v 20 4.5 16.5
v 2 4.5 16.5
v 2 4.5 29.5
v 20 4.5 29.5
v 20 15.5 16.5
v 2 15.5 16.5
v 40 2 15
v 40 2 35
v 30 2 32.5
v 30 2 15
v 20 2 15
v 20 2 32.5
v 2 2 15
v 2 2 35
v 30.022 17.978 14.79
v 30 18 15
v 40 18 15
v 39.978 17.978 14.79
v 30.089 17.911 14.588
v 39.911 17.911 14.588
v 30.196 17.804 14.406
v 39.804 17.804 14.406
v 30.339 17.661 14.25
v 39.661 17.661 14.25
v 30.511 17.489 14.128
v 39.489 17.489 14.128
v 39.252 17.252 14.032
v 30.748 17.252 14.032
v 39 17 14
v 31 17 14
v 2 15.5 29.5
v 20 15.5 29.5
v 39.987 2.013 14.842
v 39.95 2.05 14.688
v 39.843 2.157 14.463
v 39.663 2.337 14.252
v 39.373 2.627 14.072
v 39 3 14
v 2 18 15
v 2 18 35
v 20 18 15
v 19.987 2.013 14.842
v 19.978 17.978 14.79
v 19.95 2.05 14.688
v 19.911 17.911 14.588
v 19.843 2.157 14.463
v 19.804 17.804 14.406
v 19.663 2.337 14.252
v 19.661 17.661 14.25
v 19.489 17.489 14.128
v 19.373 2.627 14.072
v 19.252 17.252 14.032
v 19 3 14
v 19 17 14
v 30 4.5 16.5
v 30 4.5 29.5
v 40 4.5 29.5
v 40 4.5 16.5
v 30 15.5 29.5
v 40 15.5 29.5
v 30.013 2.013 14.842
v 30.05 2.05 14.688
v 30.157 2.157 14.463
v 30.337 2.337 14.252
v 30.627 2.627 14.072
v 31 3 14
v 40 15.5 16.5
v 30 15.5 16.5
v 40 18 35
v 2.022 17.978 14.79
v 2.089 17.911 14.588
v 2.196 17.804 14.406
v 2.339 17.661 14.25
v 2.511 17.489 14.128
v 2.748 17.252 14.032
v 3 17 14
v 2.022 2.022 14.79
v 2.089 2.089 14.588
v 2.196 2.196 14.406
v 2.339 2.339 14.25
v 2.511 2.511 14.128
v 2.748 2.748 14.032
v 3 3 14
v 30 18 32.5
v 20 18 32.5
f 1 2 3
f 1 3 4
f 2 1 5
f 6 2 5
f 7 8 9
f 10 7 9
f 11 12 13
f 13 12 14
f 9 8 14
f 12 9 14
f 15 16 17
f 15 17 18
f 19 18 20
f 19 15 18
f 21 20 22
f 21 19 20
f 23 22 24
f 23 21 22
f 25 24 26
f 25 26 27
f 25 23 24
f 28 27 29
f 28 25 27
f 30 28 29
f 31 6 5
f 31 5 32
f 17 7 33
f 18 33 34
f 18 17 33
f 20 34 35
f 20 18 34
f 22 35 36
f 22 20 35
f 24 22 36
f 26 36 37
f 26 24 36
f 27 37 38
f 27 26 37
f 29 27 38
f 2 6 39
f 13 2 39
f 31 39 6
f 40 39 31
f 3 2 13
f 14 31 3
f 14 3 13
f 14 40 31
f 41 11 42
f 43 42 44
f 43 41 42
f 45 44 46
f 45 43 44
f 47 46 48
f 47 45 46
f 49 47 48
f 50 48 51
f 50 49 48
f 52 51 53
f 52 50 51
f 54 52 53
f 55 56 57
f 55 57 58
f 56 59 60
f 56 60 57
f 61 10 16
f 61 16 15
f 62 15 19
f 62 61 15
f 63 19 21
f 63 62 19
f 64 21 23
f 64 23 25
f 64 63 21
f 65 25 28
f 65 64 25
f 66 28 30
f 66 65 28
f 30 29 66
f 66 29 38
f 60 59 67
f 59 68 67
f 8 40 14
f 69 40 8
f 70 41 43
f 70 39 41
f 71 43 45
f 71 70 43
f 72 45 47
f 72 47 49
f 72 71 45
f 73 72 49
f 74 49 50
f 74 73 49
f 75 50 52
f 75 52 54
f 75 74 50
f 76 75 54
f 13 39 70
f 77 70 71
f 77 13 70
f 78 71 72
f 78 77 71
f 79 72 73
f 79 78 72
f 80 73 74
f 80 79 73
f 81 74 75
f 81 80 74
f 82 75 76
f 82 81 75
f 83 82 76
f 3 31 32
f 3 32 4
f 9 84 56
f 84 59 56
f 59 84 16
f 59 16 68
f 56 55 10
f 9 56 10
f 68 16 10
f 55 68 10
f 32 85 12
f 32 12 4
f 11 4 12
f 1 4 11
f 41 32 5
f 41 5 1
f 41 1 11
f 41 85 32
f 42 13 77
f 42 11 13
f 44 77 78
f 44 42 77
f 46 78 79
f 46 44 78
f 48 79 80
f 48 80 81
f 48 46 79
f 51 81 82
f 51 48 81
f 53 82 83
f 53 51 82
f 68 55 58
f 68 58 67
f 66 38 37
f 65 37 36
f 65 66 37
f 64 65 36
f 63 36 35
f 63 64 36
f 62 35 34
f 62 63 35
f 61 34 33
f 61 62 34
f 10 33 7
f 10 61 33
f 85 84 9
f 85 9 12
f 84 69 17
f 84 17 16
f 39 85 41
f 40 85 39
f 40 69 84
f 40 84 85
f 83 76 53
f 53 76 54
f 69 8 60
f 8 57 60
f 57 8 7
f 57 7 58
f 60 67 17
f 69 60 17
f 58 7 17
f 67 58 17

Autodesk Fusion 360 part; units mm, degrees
sketch "Sketch1" plane through (0, 0, 0) normal (0, 0, 1) x (1, 0, 0)
  line L0 (0, 0) -> (60, 0)
  line L1 (60, 0) -> (60, 20)
  line L2 (60, 20) -> (0, 20)
  line L3 (0, 20) -> (0, 0)
  dimension "d1" = 60
  dimension "d2" = 20
extrude "Extrude1" add sketch "Sketch1" along normal blind 40
sketch "Sketch2" plane through (0, 0, 0) normal (-1, 0, 0) x (0, -1, 0)
  line L0 (-20, 0) -> (0, 0)
  line L1 (0, 0) -> (0, 40)
  line L2 (0, 40) -> (-20, 40)
  line L3 (-20, 40) -> (-20, 0)
  line L4 (-15, 28) -> (-5, 28)
  line L5 (-5, 28) -> (-5, 16)
  line L6 (-5, 16) -> (-15, 16)
  line L7 (-15, 16) -> (-15, 28)
  dimension "d5" = 10
  dimension "d6" = 12
  dimension "d7" = 5
extrude "Extrude2" cut sketch "Sketch2" against normal blind 30 contours L4 L5 L6 L7
extrude "Extrude3" cut 1 faces at (20, 13.3333, 40) along direction (0, 0, -1) blind 2
extrude "Extrude4" cut 1 faces at (20, 13.3333, 0) along direction (0, 0, 1) blind 2
sketch "Sketch3" plane through (0, 20, 0) normal (0, 1, 0) x (-1, 0, 0)
  line L0 (-60, 2) -> (0, 2)
  line L1 (0, 2) -> (0, 38)
  line L2 (0, 38) -> (-60, 38)
  line L3 (-60, 38) -> (-60, 2)
  line L4 (-40, 33) -> (-20, 33)
  line L5 (-20, 33) -> (-20, -1)
  line L6 (-20, -1) -> (-40, -1)
  line L7 (-40, -1) -> (-40, 33)
  dimension "d14" = 20
  dimension "d15" = 34
  dimension "d16" = 20
  dimension "d17" = 5
extrude "Extrude5" cut 1 faces at (20, 13.3333, 2) along direction (0, 0, 1) blind 9
extrude "Extrude6" cut 1 faces at (20, 13.3333, 11) along direction (0, 0, 1) blind 1
extrude "Extrude7" cut sketch "Sketch3" against normal blind 20 contours L0 L4 L5 L7
extrude "Extrude8" cut sketch "Sketch2" against normal blind 80 contours L4 L5 L6 L7
extrude "Extrude9" cut 1 faces at (20, 13.3333, 38) along direction (0, 0, -1) blind 1
extrude "Extrude10" cut 1 faces at (60, 8.3333, 34) along direction (-1, 0, 0) blind 10
extrude "Extrude11" add 1 faces at (40, 1.6667, 24.3333) along direction (-1, 0, 0) blind 10
extrude "Extrude12" cut 1 faces at (50, 8.3333, 34) along direction (-1, 0, 0) blind 10
extrude "Extrude13" cut 1 faces at (6.6667, 20, 27.3333) along direction (0, -1, 0) blind 2
extrude "Extrude14" cut 1 faces at (6.6667, 0, 27.3333) along direction (0, 1, 0) blind 2
extrude "Extrude15" cut 1 faces at (36.6667, 12.6667, 12) along direction (0, 0, 1) blind 1
extrude "Extrude16" cut 1 faces at (13.3333, 7.3333, 12) along direction (0, 0, 1) blind 1
extrude "Extrude17" cut 1 faces at (36.6667, 12.6667, 13) along direction (0, 0, 1) blind 1
extrude "Extrude18" cut 1 faces at (13.3333, 7.3333, 13) along direction (0, 0, 1) blind 1
extrude "Extrude19" cut sketch "Sketch2" against normal blind 2
extrude "Extrude20" cut 1 faces at (14.6667, 7.3333, 37) along direction (0, 0, -1) blind 1
extrude "Extrude21" add 1 faces at (26.6667, 12.6667, 33) along direction (0, 0, -1) blind 1
extrude "Extrude22" cut 1 faces at (14.6667, 7.3333, 36) along direction (0, 0, -1) blind 1
fillet "Fillet1" radius 1 2 faces at (36.6667, 12.6667, 14) (14, 7.3333, 14)
sketch "Sketch4" plane through (2, 0, 0) normal (-1, 0, 0) x (0, -1, 0)
  line L0 (-5, 16) -> (-15, 16)
  line L1 (-15, 16) -> (-15, 28)
  line L2 (-15, 28) -> (-5, 28)
  line L3 (-5, 28) -> (-5, 16)
  line L4 (-18, 15) -> (-2, 15)
  line L5 (-2, 15) -> (-2, 35)
  line L6 (-2, 35) -> (-18, 35)
  line L7 (-18, 35) -> (-18, 15)
  line L8 (-15.5, 28.5) -> (-4.5, 28.5)
  line L9 (-4.5, 28.5) -> (-4.5, 15.5)
  line L10 (-4.5, 15.5) -> (-15.5, 15.5)
  line L11 (-15.5, 15.5) -> (-15.5, 28.5)
  dimension "d56" = 11
  dimension "d57" = 13
  dimension "d58" = 2.5
  dimension "d59" = 6.5
extrude "Extrude23" cut sketch "Sketch4" against normal blind 50 contours L8 L9 L10 L11
extrude "Extrude24" add 2 faces at (36.6667, 8.1667, 15.5) (14, 11.8333, 15.5) along direction (0, 0, 1) blind 1
extrude "Extrude25" cut 2 faces at (33.3333, 11.8333, 28.5) (14, 11.8333, 28.5) along direction (0, 0, 1) blind 1
extrude "Extrude26" cut 1 faces at (26.6667, 12.6667, 32) along direction (0, 0, 1) blind 0.5
